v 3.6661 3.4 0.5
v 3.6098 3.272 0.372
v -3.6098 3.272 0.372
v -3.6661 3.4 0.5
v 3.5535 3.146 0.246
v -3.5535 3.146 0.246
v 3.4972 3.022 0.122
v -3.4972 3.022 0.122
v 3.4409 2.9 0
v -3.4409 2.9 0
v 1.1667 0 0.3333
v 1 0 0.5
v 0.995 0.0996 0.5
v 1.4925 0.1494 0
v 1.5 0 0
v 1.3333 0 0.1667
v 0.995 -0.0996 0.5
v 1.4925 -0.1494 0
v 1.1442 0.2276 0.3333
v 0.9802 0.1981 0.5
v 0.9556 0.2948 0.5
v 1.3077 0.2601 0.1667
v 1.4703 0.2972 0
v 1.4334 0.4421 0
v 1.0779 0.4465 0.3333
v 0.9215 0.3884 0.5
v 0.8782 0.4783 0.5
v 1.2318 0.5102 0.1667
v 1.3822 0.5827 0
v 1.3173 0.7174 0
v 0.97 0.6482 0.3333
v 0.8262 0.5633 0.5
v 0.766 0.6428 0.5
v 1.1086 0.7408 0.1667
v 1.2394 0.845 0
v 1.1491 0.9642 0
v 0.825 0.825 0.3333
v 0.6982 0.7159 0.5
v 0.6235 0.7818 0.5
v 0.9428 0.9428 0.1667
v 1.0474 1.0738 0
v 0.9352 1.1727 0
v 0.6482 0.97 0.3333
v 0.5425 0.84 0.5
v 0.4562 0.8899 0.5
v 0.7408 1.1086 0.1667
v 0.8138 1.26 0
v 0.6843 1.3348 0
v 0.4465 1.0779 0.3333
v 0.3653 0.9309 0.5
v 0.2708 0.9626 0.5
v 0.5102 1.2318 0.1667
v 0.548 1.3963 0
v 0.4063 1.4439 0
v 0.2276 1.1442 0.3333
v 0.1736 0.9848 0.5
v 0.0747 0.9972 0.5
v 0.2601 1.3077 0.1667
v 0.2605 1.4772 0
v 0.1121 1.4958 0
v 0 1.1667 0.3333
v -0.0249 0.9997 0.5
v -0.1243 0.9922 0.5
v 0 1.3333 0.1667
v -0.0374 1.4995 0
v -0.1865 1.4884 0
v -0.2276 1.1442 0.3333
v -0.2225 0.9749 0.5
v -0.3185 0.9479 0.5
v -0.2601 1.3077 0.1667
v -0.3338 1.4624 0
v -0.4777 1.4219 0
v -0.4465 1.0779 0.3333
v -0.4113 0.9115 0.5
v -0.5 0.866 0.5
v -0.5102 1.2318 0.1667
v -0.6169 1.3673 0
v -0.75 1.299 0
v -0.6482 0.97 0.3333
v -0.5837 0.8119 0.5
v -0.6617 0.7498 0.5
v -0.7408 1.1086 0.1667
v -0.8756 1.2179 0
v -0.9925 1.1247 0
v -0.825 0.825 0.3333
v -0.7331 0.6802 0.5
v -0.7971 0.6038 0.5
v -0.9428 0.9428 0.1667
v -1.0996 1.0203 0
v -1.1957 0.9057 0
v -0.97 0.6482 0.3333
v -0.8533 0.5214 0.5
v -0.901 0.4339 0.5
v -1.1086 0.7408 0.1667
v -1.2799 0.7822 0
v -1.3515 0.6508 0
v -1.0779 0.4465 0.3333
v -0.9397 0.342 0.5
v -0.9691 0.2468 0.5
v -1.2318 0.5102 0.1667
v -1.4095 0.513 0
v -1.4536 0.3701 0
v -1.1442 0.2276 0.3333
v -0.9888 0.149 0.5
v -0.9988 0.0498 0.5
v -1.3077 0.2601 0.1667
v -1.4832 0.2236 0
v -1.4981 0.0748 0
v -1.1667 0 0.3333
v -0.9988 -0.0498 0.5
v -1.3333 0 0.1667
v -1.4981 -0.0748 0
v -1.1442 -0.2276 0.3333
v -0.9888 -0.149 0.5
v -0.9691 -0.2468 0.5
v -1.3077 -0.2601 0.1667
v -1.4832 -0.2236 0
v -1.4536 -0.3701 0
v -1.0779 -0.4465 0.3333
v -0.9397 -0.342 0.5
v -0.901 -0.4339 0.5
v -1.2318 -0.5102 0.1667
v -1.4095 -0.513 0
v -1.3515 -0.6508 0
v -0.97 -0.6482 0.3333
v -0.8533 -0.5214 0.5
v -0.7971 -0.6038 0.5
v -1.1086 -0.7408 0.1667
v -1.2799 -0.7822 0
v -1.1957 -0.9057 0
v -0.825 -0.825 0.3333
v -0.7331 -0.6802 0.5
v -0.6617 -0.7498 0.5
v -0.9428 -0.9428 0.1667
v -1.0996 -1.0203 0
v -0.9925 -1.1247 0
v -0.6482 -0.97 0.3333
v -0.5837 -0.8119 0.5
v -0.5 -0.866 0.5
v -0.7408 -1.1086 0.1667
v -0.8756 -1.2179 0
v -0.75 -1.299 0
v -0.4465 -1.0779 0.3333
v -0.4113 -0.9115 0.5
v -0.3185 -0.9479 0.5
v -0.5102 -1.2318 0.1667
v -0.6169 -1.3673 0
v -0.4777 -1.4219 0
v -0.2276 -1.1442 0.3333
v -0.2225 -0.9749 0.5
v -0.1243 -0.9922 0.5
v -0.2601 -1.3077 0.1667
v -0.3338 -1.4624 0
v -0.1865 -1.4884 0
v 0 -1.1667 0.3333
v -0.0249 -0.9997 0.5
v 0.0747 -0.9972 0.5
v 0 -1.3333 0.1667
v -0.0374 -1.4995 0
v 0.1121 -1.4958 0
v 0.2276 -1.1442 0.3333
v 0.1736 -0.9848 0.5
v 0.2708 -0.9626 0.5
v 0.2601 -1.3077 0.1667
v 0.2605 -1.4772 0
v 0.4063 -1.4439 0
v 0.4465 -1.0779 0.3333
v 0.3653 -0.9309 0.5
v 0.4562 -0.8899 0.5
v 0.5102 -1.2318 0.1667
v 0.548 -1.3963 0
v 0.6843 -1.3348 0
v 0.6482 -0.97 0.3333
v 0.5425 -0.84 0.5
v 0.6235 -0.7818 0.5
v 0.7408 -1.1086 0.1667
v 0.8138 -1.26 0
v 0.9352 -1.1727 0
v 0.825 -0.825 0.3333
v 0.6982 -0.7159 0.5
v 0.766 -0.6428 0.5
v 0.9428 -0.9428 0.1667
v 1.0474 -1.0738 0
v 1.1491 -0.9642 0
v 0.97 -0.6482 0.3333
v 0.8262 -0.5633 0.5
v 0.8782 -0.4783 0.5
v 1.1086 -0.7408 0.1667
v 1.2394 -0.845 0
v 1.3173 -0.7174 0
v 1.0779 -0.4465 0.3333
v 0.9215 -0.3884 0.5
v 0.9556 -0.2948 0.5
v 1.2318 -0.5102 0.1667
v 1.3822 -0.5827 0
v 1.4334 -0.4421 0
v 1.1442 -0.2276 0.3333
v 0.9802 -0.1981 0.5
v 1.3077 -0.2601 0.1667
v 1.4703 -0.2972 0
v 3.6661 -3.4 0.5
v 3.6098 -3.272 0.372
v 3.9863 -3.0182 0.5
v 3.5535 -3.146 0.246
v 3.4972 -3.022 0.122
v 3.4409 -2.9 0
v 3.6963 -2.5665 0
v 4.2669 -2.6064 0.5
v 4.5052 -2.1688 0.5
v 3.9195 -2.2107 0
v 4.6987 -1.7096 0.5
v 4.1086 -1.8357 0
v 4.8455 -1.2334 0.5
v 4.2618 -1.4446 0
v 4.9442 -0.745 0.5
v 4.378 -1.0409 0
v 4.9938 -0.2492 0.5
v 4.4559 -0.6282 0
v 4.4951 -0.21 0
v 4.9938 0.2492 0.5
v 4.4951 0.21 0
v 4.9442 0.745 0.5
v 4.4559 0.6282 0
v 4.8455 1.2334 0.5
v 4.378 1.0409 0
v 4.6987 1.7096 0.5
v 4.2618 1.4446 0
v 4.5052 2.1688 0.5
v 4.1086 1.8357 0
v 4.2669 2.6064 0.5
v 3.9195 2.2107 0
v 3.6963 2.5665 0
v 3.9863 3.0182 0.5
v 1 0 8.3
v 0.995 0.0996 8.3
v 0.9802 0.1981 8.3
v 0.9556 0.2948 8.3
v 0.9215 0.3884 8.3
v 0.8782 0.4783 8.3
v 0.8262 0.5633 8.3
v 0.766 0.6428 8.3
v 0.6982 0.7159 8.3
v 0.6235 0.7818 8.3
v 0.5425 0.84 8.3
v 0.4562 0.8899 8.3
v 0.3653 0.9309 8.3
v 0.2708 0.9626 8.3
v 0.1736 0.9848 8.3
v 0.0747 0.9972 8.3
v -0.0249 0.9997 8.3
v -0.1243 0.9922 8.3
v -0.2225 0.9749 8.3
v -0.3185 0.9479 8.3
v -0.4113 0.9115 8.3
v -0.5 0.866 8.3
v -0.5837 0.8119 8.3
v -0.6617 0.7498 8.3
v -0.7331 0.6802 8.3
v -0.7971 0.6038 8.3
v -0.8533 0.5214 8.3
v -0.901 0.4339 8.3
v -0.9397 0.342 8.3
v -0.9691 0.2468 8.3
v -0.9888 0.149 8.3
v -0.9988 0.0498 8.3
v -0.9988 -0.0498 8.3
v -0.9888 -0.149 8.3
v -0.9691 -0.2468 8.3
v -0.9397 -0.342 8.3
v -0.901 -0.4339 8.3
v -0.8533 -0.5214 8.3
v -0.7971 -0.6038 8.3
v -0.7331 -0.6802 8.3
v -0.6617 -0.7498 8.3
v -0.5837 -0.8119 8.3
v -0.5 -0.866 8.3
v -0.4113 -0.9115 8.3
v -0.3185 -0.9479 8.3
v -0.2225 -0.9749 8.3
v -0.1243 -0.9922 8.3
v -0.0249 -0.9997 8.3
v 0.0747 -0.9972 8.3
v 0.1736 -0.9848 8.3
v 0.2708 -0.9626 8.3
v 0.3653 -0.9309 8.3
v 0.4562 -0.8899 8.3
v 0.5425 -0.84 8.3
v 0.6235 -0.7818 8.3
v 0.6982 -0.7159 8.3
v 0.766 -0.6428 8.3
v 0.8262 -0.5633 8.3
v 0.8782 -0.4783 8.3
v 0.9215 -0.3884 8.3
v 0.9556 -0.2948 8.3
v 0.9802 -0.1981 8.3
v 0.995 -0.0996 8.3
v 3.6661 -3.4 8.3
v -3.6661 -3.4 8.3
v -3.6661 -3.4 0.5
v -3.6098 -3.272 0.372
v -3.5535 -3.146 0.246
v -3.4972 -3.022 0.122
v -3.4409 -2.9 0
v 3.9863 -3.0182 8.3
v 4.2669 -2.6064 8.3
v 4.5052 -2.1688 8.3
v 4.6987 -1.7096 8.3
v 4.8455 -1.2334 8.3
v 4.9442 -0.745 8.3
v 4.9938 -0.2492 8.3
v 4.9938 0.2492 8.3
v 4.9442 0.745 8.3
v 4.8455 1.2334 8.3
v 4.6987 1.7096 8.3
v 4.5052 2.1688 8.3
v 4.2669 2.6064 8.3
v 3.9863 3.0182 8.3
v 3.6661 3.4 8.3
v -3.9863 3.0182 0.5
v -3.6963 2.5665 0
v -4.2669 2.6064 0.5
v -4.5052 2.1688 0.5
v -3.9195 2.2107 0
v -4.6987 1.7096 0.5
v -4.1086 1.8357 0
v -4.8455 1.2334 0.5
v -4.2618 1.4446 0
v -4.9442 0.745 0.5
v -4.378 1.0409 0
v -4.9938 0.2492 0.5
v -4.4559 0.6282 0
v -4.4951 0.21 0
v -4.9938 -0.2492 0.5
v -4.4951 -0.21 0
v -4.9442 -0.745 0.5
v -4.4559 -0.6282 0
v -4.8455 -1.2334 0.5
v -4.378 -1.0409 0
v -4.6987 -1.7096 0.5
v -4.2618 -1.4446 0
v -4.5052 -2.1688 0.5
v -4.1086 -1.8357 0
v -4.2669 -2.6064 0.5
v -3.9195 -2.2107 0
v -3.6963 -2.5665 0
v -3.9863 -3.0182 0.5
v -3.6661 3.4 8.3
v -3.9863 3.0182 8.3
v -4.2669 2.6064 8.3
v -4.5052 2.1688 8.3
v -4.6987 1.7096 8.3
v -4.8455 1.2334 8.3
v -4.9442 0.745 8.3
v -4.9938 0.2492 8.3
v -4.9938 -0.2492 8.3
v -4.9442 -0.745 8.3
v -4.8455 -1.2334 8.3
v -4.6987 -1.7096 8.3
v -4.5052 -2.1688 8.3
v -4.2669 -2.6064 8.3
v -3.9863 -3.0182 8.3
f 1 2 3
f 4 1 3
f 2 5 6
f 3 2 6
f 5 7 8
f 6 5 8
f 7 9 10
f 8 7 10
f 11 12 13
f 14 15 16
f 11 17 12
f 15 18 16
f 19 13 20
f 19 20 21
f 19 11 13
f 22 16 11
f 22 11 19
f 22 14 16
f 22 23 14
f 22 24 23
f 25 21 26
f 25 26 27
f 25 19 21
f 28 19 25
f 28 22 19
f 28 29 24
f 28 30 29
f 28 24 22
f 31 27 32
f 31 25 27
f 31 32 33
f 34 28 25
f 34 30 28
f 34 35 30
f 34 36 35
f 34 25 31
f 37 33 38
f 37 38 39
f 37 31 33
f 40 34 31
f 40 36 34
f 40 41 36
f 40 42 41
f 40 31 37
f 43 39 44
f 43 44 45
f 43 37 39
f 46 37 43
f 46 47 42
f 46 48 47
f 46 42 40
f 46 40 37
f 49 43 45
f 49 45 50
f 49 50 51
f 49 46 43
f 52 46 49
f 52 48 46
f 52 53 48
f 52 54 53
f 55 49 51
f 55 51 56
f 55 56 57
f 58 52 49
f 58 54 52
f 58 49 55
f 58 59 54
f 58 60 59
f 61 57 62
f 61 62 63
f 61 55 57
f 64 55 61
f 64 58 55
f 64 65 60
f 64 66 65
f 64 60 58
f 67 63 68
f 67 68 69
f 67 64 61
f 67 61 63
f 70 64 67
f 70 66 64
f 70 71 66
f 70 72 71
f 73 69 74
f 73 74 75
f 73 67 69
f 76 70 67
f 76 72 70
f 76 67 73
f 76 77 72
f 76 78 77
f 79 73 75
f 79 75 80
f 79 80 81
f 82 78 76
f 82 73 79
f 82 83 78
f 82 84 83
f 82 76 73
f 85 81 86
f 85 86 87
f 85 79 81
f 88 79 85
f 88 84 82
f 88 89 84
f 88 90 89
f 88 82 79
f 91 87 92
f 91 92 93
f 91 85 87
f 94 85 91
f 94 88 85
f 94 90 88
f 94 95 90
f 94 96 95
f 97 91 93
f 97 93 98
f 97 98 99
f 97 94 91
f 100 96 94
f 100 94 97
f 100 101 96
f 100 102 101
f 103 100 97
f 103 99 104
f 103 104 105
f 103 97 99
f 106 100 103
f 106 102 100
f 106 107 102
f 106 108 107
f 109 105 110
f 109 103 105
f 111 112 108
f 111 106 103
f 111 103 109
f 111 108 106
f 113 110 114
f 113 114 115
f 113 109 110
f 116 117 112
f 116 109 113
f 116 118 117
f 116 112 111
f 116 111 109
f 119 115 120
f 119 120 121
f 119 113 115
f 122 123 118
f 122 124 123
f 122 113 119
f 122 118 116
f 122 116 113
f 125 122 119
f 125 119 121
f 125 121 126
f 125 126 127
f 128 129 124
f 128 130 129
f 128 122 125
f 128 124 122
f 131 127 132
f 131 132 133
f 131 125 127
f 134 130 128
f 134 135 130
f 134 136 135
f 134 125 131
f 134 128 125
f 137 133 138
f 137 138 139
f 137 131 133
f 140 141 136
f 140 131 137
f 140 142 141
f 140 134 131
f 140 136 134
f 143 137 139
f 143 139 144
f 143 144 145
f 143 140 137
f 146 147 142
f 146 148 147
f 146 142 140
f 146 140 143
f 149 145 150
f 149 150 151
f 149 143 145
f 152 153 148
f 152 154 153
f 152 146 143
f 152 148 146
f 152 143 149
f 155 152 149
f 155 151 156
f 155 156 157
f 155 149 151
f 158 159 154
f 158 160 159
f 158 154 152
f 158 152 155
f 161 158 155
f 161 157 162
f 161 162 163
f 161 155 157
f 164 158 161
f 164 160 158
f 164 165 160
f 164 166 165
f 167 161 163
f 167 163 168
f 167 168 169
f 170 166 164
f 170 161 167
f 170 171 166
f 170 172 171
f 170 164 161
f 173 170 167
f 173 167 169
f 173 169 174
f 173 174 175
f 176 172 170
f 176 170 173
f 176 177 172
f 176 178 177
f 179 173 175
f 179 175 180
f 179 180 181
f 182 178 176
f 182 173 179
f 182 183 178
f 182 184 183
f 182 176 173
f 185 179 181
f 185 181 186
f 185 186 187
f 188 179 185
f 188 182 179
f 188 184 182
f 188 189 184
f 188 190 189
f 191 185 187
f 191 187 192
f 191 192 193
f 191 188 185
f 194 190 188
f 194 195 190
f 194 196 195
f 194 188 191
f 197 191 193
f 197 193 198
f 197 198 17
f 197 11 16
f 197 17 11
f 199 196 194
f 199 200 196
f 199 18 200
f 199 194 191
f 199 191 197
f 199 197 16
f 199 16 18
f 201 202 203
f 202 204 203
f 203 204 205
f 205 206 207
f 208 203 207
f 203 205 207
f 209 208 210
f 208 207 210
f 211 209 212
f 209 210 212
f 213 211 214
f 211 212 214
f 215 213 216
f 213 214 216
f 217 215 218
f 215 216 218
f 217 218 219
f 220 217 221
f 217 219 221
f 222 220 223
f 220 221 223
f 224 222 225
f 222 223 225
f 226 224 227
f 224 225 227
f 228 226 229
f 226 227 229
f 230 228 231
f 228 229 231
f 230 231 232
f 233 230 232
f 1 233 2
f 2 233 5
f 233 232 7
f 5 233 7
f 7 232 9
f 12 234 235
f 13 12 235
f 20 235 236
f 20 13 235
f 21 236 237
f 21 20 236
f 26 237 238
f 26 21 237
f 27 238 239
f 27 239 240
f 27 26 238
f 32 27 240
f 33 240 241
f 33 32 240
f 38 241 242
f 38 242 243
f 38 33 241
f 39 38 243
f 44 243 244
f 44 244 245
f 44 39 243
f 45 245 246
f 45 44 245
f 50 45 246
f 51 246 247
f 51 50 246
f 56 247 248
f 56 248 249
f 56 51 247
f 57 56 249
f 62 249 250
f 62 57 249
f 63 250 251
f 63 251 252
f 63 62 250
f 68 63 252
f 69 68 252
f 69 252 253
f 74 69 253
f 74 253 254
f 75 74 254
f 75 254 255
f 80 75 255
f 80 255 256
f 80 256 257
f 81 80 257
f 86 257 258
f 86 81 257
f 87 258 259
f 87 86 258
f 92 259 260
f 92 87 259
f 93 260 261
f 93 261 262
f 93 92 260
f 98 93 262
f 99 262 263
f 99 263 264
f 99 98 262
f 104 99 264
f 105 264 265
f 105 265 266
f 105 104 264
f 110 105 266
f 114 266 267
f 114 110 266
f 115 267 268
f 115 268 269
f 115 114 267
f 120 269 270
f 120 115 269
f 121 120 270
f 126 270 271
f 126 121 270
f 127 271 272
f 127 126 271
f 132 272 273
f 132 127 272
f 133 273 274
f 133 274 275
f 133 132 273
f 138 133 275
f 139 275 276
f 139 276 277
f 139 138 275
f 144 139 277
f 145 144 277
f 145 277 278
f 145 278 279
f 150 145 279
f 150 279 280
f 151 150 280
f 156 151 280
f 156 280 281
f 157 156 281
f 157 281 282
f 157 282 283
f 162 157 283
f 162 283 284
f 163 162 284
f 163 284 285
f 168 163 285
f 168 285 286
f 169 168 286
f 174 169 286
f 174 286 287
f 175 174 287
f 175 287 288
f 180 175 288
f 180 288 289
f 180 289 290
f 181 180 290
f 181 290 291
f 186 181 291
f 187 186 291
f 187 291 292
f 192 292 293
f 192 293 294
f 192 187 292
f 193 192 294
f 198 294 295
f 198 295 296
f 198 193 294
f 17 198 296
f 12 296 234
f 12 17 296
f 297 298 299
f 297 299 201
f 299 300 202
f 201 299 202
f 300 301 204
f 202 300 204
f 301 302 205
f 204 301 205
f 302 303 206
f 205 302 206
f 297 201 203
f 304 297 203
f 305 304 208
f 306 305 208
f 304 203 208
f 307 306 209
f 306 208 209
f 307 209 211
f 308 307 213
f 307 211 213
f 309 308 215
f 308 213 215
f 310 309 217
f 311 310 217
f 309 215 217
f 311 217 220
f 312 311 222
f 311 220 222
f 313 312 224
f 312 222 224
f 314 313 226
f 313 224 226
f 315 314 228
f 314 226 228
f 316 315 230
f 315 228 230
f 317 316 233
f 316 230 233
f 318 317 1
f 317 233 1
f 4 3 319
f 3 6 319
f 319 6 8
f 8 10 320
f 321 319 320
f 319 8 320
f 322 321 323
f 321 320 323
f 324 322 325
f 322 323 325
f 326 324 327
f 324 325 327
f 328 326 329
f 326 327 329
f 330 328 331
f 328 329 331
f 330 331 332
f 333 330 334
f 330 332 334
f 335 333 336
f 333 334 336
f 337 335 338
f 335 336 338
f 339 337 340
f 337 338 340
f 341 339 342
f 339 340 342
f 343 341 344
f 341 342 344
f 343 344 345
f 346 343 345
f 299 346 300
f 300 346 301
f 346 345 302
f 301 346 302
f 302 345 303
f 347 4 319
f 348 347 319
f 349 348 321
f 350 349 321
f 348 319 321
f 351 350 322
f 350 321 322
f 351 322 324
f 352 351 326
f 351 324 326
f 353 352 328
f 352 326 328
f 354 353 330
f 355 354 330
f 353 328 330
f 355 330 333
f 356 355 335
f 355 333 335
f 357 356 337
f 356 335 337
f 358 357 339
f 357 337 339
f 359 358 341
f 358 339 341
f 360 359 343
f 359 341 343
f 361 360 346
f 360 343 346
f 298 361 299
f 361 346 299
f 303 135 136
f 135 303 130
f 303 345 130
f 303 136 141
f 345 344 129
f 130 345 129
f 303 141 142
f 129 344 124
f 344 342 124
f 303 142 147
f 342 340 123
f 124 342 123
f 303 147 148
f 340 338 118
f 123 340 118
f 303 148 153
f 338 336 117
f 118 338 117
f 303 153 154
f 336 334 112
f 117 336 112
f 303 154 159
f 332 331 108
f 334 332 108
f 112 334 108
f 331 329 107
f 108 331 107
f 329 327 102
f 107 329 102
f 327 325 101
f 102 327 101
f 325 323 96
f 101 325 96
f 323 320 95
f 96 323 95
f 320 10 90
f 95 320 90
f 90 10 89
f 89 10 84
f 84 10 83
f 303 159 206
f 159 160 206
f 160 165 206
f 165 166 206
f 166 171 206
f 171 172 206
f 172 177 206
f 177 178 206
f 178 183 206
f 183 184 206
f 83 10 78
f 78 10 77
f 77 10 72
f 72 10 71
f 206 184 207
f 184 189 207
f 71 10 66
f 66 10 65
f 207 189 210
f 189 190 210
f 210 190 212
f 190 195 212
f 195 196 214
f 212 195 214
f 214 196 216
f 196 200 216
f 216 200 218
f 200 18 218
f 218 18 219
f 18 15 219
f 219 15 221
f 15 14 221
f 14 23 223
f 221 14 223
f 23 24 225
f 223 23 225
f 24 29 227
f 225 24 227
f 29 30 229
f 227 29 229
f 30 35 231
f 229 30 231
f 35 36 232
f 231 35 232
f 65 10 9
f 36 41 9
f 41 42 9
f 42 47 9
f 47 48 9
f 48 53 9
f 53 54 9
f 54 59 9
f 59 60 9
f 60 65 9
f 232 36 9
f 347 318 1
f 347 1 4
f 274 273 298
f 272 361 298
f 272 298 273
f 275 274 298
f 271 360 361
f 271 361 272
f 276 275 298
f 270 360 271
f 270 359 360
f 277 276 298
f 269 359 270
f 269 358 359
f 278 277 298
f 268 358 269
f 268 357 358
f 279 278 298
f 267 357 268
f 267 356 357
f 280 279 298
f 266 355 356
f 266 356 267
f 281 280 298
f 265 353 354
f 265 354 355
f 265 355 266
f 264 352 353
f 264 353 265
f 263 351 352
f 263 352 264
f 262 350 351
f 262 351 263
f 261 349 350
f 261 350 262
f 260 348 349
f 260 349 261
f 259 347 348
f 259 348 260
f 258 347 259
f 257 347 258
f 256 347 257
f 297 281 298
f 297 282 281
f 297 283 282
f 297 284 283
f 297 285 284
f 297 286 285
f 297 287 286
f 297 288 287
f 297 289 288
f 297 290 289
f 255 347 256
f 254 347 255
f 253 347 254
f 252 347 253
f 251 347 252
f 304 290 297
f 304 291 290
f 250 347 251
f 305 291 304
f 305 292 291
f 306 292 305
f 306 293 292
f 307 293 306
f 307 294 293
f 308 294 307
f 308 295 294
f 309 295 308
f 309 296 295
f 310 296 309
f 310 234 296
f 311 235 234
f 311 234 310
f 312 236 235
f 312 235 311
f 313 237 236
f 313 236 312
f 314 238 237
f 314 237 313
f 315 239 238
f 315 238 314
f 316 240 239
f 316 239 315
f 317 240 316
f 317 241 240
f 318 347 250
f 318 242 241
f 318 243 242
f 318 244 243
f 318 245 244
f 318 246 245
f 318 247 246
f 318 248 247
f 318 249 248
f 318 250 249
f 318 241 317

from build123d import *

# Parameters (mm, degrees)
F0_R     = 1
F1_DEPTH = 8.3
F2_SIZE  = 0.5


with BuildPart() as f1:
    # F0 (on Top) → F1 (new body)
    with BuildSketch(Plane.XY):
        with BuildLine():
            Line((3.666061, 3.4), (-3.666061, 3.4))
            ThreePointArc((-3.666061, 3.4), (-5, 0), (-3.666061, -3.4))
            Line((-3.666061, -3.4), (3.666061, -3.4))
            ThreePointArc((3.666061, -3.4), (5, 0), (3.666061, 3.4))
        make_face()
        Circle(F0_R, mode=Mode.SUBTRACT)
    extrude(amount=F1_DEPTH)

    # F2
    f2_edges = [f1.edges().sort_by_distance(p)[0] for p in [
        (-5, 0, 0),
        (0, -3.4, 0),
        (5, 0, 0),
        (0, 3.4, 0),
        (-1, 0, 0),
    ]]
    chamfer(f2_edges, length=F2_SIZE)


solid = f1.part
